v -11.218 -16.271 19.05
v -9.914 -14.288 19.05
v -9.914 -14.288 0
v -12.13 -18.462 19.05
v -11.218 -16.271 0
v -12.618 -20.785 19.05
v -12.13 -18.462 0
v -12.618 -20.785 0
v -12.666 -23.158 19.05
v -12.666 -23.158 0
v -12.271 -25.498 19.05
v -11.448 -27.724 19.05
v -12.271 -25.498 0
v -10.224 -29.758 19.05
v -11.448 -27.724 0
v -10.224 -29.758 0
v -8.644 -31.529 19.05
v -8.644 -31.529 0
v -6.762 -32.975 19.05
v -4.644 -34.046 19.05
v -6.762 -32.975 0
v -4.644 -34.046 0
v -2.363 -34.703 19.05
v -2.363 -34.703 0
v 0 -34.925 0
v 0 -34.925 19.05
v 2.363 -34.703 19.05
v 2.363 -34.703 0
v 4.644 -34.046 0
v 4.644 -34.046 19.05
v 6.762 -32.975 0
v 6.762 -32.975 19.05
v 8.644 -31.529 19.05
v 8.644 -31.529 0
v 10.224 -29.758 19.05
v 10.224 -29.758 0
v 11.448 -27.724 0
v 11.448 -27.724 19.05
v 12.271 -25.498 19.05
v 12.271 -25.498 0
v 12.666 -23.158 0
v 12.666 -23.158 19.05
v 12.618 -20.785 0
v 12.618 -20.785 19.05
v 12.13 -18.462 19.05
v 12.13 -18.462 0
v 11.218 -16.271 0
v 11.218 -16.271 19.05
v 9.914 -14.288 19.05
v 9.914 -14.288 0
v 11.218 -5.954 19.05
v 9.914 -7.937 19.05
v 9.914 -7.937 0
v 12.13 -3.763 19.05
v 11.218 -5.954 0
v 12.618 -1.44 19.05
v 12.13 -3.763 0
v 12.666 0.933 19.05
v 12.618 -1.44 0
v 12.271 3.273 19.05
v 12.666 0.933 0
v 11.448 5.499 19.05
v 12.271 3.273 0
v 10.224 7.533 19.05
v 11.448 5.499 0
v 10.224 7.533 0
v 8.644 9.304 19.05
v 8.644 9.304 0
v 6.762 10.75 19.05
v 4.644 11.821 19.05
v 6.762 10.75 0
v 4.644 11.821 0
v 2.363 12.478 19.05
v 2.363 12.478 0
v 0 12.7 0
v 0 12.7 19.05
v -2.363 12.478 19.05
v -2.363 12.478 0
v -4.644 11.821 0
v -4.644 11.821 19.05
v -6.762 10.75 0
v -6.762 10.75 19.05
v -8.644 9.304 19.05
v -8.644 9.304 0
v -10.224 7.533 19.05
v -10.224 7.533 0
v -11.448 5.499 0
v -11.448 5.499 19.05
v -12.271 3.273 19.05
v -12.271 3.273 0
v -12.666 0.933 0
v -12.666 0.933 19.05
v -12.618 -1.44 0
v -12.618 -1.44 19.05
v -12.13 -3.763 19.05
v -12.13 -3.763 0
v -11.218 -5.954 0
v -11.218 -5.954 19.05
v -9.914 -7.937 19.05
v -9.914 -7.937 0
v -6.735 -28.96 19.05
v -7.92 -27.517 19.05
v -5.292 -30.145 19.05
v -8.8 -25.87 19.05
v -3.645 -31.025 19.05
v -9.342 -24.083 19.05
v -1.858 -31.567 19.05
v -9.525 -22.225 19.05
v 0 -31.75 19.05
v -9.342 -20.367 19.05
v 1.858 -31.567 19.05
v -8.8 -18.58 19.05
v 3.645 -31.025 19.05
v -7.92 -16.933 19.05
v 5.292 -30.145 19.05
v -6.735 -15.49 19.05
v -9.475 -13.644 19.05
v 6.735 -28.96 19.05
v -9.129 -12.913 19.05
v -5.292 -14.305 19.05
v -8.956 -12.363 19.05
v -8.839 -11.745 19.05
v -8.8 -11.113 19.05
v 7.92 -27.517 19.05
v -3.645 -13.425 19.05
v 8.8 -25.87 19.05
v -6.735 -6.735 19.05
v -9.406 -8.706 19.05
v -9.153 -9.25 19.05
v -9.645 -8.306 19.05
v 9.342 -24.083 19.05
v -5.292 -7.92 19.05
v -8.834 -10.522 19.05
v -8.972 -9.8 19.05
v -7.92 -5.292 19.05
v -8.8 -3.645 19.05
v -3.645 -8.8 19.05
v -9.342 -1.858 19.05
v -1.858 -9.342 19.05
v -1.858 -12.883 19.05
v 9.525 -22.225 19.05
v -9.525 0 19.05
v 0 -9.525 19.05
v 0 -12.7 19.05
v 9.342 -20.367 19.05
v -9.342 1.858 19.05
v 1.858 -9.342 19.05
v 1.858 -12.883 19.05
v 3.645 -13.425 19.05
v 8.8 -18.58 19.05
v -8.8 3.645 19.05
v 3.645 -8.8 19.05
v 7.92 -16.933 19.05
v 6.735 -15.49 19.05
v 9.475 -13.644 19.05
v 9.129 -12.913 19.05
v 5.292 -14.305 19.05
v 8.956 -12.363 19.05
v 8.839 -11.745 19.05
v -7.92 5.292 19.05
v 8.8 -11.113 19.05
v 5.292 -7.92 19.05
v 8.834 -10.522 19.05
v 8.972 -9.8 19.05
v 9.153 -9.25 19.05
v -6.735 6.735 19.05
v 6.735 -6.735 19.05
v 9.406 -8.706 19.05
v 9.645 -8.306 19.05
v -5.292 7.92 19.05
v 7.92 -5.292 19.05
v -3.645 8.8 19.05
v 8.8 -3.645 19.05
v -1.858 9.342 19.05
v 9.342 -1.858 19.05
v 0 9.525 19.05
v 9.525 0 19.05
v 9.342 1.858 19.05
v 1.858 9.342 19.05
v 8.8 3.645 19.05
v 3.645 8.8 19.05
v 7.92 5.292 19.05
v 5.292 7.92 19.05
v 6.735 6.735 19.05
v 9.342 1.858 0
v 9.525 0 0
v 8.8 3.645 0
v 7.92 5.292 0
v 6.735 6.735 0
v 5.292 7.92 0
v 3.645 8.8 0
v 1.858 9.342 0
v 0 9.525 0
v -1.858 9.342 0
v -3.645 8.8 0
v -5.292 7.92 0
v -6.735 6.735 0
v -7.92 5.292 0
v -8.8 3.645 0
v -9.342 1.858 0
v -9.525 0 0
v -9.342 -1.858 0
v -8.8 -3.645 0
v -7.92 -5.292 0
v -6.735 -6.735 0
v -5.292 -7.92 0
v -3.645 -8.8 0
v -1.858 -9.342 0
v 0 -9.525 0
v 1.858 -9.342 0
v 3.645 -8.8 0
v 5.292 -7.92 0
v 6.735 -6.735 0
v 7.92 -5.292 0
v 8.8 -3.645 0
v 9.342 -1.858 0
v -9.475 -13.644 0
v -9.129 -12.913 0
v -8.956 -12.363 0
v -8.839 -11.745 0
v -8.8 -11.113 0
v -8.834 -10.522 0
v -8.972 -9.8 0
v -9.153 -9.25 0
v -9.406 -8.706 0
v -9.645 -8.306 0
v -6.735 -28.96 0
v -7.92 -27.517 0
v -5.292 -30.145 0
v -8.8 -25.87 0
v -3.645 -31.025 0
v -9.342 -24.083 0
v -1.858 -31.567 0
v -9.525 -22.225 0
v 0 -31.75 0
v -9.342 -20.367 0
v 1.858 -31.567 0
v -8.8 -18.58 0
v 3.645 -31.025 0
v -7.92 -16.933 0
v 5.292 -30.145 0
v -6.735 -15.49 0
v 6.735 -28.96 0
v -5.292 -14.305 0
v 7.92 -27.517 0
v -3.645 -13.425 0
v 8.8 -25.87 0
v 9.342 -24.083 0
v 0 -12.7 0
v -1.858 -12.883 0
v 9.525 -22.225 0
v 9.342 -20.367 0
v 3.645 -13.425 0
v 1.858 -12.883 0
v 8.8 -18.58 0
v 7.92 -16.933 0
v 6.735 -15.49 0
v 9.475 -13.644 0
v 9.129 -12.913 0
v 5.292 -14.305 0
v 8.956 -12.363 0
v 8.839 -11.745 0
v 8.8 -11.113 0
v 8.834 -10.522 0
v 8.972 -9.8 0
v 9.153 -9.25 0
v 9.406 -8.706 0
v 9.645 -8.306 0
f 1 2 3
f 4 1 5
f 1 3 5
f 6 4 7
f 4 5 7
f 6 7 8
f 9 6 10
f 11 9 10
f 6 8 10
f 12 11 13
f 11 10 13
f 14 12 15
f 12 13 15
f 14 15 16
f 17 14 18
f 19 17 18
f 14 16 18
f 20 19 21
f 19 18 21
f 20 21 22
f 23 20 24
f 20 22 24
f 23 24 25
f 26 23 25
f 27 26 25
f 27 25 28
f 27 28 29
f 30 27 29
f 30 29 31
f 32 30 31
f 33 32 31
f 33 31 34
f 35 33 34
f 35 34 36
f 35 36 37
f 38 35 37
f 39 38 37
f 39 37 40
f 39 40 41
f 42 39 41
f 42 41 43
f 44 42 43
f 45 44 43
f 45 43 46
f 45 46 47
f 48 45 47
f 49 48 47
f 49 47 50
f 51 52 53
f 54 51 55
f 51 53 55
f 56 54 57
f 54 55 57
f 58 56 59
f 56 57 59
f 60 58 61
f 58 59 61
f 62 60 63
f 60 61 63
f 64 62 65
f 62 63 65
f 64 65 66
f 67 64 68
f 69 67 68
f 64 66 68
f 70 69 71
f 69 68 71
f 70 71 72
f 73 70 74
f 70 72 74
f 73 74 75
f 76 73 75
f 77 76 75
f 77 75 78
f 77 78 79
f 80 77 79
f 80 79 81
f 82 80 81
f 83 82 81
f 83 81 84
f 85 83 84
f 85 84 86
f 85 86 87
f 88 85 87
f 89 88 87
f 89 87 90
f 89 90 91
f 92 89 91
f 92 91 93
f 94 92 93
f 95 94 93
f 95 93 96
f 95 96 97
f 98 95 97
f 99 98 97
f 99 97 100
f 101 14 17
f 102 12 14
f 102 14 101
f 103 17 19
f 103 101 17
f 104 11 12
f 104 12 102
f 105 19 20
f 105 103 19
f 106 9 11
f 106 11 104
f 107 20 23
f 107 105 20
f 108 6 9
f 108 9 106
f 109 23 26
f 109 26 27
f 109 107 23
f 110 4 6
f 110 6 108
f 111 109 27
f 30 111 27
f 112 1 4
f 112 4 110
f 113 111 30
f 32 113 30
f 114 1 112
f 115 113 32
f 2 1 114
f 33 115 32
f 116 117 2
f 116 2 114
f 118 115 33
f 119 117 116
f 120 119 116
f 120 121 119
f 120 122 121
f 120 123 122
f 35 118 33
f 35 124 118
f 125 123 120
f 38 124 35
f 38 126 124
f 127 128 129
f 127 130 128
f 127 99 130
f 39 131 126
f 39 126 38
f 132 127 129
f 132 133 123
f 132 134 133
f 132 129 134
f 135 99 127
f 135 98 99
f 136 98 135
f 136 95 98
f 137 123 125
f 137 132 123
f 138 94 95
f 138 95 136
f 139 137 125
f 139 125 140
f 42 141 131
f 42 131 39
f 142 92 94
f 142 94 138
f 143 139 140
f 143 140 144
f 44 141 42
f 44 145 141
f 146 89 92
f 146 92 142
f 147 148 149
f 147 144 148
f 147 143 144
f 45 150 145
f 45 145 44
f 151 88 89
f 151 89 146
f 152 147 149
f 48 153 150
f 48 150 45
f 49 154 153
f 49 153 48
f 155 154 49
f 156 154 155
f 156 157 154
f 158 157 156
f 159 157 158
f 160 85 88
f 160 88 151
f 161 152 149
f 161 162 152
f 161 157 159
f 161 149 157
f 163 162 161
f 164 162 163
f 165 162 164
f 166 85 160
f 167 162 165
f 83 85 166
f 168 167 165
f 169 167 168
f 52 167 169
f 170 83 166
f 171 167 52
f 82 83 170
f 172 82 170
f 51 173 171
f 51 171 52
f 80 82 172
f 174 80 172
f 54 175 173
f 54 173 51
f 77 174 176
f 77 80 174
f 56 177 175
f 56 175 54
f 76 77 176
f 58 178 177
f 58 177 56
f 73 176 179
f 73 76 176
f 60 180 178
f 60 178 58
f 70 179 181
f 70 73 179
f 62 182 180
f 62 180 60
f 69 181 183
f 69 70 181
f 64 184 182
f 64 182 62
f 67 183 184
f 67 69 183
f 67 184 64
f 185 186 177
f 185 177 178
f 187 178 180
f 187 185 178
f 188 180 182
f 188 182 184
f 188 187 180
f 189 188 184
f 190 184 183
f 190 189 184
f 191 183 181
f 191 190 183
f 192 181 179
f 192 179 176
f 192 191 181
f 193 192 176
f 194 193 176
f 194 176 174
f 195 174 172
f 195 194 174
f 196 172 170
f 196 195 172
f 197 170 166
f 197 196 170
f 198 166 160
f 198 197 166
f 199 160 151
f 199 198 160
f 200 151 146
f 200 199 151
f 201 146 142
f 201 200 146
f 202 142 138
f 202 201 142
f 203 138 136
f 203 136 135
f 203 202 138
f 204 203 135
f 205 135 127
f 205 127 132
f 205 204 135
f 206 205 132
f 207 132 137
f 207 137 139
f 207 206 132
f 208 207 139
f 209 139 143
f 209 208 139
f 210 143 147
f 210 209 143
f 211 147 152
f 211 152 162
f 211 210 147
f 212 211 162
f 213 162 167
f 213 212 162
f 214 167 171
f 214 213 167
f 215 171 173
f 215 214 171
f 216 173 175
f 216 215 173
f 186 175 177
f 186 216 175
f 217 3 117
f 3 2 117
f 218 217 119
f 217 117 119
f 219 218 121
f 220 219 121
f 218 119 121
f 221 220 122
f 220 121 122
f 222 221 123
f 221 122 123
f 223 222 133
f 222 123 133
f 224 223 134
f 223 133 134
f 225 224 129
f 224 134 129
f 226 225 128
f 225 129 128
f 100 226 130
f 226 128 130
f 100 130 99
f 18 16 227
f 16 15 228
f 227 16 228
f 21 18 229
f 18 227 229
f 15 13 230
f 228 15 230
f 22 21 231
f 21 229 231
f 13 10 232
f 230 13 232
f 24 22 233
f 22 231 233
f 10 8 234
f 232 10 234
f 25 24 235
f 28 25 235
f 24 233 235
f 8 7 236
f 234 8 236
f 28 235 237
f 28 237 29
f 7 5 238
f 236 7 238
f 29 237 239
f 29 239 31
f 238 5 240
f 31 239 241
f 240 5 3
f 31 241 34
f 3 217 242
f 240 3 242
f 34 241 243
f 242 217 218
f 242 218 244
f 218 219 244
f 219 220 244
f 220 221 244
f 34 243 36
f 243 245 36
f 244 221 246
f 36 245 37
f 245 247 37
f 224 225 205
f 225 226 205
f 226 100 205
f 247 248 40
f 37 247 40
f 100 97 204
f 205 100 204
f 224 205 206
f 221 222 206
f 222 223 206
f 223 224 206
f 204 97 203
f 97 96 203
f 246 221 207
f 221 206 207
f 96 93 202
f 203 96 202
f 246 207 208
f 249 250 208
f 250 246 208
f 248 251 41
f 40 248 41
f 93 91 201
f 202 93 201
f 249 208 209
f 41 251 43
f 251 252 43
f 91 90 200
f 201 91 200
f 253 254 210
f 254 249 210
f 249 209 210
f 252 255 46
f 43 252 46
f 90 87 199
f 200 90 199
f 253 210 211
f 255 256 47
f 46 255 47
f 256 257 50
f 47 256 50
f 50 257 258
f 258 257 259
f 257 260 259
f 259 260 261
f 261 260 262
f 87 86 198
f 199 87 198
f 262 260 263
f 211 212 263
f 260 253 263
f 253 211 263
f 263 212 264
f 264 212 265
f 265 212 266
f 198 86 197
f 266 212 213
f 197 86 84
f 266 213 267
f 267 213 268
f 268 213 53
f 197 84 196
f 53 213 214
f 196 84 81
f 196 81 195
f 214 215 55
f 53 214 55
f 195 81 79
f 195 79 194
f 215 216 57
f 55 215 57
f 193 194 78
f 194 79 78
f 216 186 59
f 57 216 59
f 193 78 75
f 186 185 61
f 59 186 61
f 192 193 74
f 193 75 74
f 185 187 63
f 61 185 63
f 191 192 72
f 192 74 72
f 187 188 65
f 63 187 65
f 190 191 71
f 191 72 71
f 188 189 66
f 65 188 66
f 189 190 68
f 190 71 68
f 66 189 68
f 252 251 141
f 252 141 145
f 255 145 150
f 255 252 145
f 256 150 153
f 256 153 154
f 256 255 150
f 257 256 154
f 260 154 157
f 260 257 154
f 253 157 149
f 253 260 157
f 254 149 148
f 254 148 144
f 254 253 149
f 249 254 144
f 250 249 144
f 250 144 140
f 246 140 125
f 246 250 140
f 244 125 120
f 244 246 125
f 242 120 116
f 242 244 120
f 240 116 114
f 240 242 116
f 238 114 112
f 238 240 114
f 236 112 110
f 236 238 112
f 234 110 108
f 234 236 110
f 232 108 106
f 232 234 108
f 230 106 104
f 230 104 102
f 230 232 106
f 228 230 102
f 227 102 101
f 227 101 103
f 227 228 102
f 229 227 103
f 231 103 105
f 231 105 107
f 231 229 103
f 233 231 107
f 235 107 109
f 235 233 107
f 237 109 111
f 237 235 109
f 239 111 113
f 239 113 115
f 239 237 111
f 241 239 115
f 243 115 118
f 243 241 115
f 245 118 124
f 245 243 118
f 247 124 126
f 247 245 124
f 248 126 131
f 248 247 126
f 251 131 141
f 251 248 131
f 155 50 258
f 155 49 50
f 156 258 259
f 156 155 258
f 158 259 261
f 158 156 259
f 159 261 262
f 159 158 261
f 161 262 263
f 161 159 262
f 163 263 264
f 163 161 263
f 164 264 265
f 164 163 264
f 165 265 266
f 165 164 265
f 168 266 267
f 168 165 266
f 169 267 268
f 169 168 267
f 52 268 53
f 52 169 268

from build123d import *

# Parameters (mm, degrees)
F0_R     = 9.525
F1_DEPTH = 19.05
F2_R     = 5.08


with BuildPart() as f1:
    # F0 (on Top) → F1 (new body)
    with BuildSketch(Plane.XY):
        with BuildLine():
            ThreePointArc((-6.1483610621, -11.1125), (0, -34.925), (6.1483610621, -11.1125))
            ThreePointArc((6.1483610621, -11.1125), (0, 12.7), (-6.1483610621, -11.1125))
        make_face()
        with Locations((0, -22.225)):
            Circle(F0_R, mode=Mode.SUBTRACT)
        Circle(F0_R, mode=Mode.SUBTRACT)
    extrude(amount=F1_DEPTH)

    # F2
    f2_edges = [f1.edges().sort_by_distance(p)[0] for p in [
        (6.148361, -11.1125, 9.525),
        (-6.148361, -11.1125, 9.525),
    ]]
    fillet(f2_edges, radius=F2_R)


solid = f1.part
